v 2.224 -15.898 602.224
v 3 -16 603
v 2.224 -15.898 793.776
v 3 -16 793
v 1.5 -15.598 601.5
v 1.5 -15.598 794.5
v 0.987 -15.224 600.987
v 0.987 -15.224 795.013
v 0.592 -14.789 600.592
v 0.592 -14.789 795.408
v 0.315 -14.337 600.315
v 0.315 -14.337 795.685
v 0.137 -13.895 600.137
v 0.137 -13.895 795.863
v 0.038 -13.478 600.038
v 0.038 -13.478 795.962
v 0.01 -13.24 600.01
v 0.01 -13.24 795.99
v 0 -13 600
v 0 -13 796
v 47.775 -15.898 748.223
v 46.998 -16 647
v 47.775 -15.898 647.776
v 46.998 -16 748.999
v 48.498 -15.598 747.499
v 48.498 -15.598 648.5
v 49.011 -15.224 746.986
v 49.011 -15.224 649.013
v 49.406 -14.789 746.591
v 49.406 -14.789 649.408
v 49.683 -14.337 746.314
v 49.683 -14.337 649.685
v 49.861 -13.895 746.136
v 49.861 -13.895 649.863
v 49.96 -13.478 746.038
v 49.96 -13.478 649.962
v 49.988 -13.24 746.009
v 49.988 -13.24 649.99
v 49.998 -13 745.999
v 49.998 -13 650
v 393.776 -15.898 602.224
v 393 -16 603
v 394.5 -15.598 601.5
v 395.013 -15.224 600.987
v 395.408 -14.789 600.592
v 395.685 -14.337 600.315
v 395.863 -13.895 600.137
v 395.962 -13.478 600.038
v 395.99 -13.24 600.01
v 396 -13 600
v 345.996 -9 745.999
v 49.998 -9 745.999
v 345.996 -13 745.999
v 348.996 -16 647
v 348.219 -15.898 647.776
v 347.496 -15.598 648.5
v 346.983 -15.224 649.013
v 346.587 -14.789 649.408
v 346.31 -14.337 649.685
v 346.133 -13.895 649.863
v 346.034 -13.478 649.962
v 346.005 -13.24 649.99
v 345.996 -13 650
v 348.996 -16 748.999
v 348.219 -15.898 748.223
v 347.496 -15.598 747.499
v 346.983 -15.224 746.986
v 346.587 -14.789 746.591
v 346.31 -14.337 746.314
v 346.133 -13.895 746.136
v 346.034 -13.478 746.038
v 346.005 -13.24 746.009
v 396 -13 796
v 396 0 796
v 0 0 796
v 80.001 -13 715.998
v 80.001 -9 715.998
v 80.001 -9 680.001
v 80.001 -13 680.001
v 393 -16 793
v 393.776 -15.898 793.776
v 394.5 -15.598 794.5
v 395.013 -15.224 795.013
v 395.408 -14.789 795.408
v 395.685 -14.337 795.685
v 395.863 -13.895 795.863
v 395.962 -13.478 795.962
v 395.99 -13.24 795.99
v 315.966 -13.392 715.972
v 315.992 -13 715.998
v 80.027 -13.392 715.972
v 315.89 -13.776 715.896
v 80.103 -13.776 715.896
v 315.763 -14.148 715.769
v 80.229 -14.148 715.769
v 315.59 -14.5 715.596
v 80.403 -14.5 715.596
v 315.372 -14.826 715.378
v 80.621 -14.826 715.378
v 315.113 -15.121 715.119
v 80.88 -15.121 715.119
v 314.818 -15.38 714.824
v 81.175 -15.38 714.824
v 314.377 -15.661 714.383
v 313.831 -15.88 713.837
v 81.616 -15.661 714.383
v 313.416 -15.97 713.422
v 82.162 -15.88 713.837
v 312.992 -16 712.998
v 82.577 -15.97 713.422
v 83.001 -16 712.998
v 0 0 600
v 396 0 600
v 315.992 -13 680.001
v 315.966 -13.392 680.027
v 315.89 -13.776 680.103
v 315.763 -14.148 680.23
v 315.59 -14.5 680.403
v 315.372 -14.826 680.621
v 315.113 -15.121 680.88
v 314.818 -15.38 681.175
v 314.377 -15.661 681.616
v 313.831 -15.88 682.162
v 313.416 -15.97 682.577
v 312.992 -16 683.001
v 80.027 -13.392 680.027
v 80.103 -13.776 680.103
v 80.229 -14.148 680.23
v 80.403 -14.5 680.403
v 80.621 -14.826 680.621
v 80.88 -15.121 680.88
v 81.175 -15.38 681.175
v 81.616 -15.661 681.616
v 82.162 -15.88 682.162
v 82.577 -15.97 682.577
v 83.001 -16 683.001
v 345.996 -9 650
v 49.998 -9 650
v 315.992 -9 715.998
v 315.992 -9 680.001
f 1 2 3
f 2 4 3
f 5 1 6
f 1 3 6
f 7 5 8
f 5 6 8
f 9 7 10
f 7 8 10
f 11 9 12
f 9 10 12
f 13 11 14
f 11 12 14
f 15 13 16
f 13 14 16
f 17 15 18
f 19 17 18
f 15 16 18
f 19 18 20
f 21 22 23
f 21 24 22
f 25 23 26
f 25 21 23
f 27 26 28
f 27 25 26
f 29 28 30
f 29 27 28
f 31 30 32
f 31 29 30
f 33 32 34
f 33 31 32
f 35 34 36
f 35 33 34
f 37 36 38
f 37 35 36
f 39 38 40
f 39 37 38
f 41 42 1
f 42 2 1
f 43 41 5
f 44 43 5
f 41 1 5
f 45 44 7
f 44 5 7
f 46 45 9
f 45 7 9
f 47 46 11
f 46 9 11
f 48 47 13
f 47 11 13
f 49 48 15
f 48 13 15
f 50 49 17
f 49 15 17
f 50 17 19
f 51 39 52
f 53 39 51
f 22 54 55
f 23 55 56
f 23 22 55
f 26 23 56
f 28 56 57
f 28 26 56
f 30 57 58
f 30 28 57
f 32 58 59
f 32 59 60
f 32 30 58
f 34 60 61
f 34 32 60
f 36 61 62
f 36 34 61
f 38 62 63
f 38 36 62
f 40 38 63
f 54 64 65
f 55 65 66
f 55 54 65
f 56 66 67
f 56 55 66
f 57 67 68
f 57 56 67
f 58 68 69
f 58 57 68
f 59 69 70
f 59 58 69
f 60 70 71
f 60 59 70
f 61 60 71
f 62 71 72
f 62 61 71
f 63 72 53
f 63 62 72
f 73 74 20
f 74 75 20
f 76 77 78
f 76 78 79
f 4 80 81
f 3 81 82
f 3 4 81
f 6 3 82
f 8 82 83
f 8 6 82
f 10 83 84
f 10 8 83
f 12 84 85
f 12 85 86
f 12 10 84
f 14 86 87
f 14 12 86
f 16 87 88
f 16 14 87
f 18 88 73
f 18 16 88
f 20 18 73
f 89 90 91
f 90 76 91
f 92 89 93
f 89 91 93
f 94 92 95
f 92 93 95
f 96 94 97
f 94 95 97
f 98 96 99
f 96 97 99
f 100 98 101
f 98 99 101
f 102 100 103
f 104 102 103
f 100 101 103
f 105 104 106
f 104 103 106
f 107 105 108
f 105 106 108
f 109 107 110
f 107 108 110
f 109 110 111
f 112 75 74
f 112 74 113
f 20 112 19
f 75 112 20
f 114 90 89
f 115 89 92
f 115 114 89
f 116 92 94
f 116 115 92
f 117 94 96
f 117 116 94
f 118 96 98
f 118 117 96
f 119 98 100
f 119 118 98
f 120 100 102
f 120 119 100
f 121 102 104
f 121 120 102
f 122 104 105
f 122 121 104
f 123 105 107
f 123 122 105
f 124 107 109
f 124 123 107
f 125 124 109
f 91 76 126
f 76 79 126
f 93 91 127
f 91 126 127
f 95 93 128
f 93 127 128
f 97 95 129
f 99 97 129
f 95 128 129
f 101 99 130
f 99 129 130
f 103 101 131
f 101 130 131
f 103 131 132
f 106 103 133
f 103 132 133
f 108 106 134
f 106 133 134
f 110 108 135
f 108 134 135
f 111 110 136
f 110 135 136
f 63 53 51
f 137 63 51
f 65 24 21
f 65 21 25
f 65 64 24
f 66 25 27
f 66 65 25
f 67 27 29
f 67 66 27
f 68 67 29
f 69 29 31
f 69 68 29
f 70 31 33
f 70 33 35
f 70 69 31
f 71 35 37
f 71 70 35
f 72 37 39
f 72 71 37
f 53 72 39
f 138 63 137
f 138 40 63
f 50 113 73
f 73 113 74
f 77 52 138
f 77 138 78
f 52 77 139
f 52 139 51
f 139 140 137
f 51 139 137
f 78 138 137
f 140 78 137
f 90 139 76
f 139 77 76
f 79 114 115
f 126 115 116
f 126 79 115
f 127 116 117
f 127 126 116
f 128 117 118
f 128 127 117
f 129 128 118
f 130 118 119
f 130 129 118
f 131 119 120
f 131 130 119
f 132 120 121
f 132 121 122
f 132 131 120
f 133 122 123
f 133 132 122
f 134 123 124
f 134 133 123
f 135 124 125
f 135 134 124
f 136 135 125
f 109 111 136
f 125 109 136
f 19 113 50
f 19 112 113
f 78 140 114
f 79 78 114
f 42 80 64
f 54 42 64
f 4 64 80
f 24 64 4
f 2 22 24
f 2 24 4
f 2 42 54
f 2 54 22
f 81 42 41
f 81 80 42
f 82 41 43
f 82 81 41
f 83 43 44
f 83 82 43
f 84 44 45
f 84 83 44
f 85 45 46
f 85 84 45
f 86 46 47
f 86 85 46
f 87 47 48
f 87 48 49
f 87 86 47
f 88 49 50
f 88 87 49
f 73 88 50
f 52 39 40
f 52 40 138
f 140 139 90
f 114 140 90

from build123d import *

# Parameters (mm, degrees)
F0_W      = 44.656470418
F0_H      = 33.8078811765
F1_DEPTH  = 16
F2_DEPTH  = 796
F3_DEPTH  = 196
F4_W      = 68.9578056335
F4_H      = 493.6993122101
F5_DEPTH  = 7
F6_DEPTH  = 9.7
F7_DEPTH  = 99.33
F8_DEPTH  = 99.33
F9_DEPTH  = 17.34
F10_DEPTH = 102.97
F11_W     = 35.2807044983
F11_H     = 492.0964837074
F12_DEPTH = 7
F13_DEPTH = 37.27
F14_DEPTH = 6.58
F15_DEPTH = 106.63
F16_DEPTH = 5.87
F17_DEPTH = 200
F18_DEPTH = 200
F19_DEPTH = 200
F20_DEPTH = 600
F21_DEPTH = 600
F22_DEPTH = 600
F23_R     = 3


with BuildPart() as f1:
    # F0 (on Front) → F1 (new body)
    with BuildSketch(Plane.XZ):
        with Locations((22.328235209, 16.9039405882)):
            Rectangle(F0_W, F0_H)
    extrude(amount=F1_DEPTH)

    # F2 (add): a face of the model
    f2_faces = [f1.faces().sort_by_distance(p)[0] for p in [
        (22.328235209, -8, 0),
    ]]
    extrude(f2_faces, amount=-F2_DEPTH)

    # F3 (add): a face of the model
    f3_faces = [f1.faces().sort_by_distance(p)[0] for p in [
        (0, -8, 398),
    ]]
    extrude(f3_faces, amount=-F3_DEPTH)

    # F4 (on face) → F5 (cut)
    with BuildSketch(Plane.XZ.offset(16)):
        with Locations((94.1769480705, 399.8196721077)):
            Rectangle(F4_W, F4_H)
    extrude(amount=-F5_DEPTH, mode=Mode.SUBTRACT)

    # F6 (cut): a face of the model
    f6_faces = [f1.faces().sort_by_distance(p)[0] for p in [
        (59.6980452538, -12.5, 399.8196721077),
    ]]
    extrude(f6_faces, amount=-F6_DEPTH, mode=Mode.SUBTRACT)

    # F7 (add): a face of the model
    f7_faces = [f1.faces().sort_by_distance(p)[0] for p in [
        (89.3269480705, -12.5, 646.6693282127),
    ]]
    extrude(f7_faces, amount=-F7_DEPTH)

    # F8 (cut): a face of the model
    f8_faces = [f1.faces().sort_by_distance(p)[0] for p in [
        (89.3269480705, -12.5, 646.6693282127),
    ]]
    extrude(f8_faces, amount=-F8_DEPTH, mode=Mode.SUBTRACT)

    # F9 (cut): a face of the model
    f9_faces = [f1.faces().sort_by_distance(p)[0] for p in [
        (128.6558508873, -12.5, 449.4846721077),
    ]]
    extrude(f9_faces, amount=-F9_DEPTH, mode=Mode.SUBTRACT)

    # F10 (cut): a face of the model
    f10_faces = [f1.faces().sort_by_distance(p)[0] for p in [
        (97.9969480705, -12.5, 152.9700160027),
    ]]
    extrude(f10_faces, amount=-F10_DEPTH, mode=Mode.SUBTRACT)

    # F11 (on face) → F12 (join)
    with BuildSketch(Plane.XZ.offset(9)):
        with Locations((91.7714834213, 432.6795041561)):
            Rectangle(F11_W, F11_H)
    extrude(amount=F12_DEPTH)

    # F13 (add): a face of the model
    f13_faces = [f1.faces().sort_by_distance(p)[0] for p in [
        (91.7714834213, -12.5, 678.7277460098),
    ]]
    extrude(f13_faces, amount=F13_DEPTH)

    # F14 (add): a face of the model
    f14_faces = [f1.faces().sort_by_distance(p)[0] for p in [
        (109.4118356705, -12.5, 451.3145041561),
    ]]
    extrude(f14_faces, amount=F14_DEPTH)

    # F15 (add): a face of the model
    f15_faces = [f1.faces().sort_by_distance(p)[0] for p in [
        (95.0614834213, -12.5, 186.6312623024),
    ]]
    extrude(f15_faces, amount=F15_DEPTH)

    # F16 (cut): a face of the model
    f16_faces = [f1.faces().sort_by_distance(p)[0] for p in [
        (74.1311311722, -12.5, 397.9995041561),
    ]]
    extrude(f16_faces, amount=-F16_DEPTH, mode=Mode.SUBTRACT)

    # F17 (add): a face of the model
    f17_faces = [f1.faces().sort_by_distance(p)[0] for p in [
        (196, -8, 398),
    ]]
    extrude(f17_faces, amount=F17_DEPTH)

    # F18 (cut): a face of the model
    f18_faces = [f1.faces().sort_by_distance(p)[0] for p in [
        (145.9958508873, -12.5, 397.9996721077),
    ]]
    extrude(f18_faces, amount=-F18_DEPTH, mode=Mode.SUBTRACT)

    # F19 (add): a face of the model
    f19_faces = [f1.faces().sort_by_distance(p)[0] for p in [
        (115.9918356705, -12.5, 397.9995041561),
    ]]
    extrude(f19_faces, amount=F19_DEPTH)

    # F20 (cut): a face of the model
    f20_faces = [f1.faces().sort_by_distance(p)[0] for p in [
        (197.9964834213, -12.5, 80.0012623024),
    ]]
    extrude(f20_faces, amount=-F20_DEPTH, mode=Mode.SUBTRACT)

    # F21 (add): a face of the model
    f21_faces = [f1.faces().sort_by_distance(p)[0] for p in [
        (197.9969480705, -12.5, 50.0000160027),
    ]]
    extrude(f21_faces, amount=F21_DEPTH)

    # F22 (cut): a face of the model
    f22_faces = [f1.faces().sort_by_distance(p)[0] for p in [
        (198, -8, 0),
    ]]
    extrude(f22_faces, amount=-F22_DEPTH, mode=Mode.SUBTRACT)

    # F23
    f23_edges = [f1.edges().sort_by_distance(p)[0] for p in [
        (0, -16, 698),
        (198, -16, 796),
        (396, -16, 698),
        (198, -16, 600),
        (197.996948, -16, 745.999328),
        (49.998045, -16, 697.999672),
        (345.995851, -16, 697.999672),
        (197.996948, -16, 650.000016),
        (197.996483, -16, 715.997746),
        (315.991836, -16, 697.999504),
        (197.996483, -16, 680.001262),
        (80.001131, -16, 697.999504),
    ]]
    fillet(f23_edges, radius=F23_R)


solid = f1.part
